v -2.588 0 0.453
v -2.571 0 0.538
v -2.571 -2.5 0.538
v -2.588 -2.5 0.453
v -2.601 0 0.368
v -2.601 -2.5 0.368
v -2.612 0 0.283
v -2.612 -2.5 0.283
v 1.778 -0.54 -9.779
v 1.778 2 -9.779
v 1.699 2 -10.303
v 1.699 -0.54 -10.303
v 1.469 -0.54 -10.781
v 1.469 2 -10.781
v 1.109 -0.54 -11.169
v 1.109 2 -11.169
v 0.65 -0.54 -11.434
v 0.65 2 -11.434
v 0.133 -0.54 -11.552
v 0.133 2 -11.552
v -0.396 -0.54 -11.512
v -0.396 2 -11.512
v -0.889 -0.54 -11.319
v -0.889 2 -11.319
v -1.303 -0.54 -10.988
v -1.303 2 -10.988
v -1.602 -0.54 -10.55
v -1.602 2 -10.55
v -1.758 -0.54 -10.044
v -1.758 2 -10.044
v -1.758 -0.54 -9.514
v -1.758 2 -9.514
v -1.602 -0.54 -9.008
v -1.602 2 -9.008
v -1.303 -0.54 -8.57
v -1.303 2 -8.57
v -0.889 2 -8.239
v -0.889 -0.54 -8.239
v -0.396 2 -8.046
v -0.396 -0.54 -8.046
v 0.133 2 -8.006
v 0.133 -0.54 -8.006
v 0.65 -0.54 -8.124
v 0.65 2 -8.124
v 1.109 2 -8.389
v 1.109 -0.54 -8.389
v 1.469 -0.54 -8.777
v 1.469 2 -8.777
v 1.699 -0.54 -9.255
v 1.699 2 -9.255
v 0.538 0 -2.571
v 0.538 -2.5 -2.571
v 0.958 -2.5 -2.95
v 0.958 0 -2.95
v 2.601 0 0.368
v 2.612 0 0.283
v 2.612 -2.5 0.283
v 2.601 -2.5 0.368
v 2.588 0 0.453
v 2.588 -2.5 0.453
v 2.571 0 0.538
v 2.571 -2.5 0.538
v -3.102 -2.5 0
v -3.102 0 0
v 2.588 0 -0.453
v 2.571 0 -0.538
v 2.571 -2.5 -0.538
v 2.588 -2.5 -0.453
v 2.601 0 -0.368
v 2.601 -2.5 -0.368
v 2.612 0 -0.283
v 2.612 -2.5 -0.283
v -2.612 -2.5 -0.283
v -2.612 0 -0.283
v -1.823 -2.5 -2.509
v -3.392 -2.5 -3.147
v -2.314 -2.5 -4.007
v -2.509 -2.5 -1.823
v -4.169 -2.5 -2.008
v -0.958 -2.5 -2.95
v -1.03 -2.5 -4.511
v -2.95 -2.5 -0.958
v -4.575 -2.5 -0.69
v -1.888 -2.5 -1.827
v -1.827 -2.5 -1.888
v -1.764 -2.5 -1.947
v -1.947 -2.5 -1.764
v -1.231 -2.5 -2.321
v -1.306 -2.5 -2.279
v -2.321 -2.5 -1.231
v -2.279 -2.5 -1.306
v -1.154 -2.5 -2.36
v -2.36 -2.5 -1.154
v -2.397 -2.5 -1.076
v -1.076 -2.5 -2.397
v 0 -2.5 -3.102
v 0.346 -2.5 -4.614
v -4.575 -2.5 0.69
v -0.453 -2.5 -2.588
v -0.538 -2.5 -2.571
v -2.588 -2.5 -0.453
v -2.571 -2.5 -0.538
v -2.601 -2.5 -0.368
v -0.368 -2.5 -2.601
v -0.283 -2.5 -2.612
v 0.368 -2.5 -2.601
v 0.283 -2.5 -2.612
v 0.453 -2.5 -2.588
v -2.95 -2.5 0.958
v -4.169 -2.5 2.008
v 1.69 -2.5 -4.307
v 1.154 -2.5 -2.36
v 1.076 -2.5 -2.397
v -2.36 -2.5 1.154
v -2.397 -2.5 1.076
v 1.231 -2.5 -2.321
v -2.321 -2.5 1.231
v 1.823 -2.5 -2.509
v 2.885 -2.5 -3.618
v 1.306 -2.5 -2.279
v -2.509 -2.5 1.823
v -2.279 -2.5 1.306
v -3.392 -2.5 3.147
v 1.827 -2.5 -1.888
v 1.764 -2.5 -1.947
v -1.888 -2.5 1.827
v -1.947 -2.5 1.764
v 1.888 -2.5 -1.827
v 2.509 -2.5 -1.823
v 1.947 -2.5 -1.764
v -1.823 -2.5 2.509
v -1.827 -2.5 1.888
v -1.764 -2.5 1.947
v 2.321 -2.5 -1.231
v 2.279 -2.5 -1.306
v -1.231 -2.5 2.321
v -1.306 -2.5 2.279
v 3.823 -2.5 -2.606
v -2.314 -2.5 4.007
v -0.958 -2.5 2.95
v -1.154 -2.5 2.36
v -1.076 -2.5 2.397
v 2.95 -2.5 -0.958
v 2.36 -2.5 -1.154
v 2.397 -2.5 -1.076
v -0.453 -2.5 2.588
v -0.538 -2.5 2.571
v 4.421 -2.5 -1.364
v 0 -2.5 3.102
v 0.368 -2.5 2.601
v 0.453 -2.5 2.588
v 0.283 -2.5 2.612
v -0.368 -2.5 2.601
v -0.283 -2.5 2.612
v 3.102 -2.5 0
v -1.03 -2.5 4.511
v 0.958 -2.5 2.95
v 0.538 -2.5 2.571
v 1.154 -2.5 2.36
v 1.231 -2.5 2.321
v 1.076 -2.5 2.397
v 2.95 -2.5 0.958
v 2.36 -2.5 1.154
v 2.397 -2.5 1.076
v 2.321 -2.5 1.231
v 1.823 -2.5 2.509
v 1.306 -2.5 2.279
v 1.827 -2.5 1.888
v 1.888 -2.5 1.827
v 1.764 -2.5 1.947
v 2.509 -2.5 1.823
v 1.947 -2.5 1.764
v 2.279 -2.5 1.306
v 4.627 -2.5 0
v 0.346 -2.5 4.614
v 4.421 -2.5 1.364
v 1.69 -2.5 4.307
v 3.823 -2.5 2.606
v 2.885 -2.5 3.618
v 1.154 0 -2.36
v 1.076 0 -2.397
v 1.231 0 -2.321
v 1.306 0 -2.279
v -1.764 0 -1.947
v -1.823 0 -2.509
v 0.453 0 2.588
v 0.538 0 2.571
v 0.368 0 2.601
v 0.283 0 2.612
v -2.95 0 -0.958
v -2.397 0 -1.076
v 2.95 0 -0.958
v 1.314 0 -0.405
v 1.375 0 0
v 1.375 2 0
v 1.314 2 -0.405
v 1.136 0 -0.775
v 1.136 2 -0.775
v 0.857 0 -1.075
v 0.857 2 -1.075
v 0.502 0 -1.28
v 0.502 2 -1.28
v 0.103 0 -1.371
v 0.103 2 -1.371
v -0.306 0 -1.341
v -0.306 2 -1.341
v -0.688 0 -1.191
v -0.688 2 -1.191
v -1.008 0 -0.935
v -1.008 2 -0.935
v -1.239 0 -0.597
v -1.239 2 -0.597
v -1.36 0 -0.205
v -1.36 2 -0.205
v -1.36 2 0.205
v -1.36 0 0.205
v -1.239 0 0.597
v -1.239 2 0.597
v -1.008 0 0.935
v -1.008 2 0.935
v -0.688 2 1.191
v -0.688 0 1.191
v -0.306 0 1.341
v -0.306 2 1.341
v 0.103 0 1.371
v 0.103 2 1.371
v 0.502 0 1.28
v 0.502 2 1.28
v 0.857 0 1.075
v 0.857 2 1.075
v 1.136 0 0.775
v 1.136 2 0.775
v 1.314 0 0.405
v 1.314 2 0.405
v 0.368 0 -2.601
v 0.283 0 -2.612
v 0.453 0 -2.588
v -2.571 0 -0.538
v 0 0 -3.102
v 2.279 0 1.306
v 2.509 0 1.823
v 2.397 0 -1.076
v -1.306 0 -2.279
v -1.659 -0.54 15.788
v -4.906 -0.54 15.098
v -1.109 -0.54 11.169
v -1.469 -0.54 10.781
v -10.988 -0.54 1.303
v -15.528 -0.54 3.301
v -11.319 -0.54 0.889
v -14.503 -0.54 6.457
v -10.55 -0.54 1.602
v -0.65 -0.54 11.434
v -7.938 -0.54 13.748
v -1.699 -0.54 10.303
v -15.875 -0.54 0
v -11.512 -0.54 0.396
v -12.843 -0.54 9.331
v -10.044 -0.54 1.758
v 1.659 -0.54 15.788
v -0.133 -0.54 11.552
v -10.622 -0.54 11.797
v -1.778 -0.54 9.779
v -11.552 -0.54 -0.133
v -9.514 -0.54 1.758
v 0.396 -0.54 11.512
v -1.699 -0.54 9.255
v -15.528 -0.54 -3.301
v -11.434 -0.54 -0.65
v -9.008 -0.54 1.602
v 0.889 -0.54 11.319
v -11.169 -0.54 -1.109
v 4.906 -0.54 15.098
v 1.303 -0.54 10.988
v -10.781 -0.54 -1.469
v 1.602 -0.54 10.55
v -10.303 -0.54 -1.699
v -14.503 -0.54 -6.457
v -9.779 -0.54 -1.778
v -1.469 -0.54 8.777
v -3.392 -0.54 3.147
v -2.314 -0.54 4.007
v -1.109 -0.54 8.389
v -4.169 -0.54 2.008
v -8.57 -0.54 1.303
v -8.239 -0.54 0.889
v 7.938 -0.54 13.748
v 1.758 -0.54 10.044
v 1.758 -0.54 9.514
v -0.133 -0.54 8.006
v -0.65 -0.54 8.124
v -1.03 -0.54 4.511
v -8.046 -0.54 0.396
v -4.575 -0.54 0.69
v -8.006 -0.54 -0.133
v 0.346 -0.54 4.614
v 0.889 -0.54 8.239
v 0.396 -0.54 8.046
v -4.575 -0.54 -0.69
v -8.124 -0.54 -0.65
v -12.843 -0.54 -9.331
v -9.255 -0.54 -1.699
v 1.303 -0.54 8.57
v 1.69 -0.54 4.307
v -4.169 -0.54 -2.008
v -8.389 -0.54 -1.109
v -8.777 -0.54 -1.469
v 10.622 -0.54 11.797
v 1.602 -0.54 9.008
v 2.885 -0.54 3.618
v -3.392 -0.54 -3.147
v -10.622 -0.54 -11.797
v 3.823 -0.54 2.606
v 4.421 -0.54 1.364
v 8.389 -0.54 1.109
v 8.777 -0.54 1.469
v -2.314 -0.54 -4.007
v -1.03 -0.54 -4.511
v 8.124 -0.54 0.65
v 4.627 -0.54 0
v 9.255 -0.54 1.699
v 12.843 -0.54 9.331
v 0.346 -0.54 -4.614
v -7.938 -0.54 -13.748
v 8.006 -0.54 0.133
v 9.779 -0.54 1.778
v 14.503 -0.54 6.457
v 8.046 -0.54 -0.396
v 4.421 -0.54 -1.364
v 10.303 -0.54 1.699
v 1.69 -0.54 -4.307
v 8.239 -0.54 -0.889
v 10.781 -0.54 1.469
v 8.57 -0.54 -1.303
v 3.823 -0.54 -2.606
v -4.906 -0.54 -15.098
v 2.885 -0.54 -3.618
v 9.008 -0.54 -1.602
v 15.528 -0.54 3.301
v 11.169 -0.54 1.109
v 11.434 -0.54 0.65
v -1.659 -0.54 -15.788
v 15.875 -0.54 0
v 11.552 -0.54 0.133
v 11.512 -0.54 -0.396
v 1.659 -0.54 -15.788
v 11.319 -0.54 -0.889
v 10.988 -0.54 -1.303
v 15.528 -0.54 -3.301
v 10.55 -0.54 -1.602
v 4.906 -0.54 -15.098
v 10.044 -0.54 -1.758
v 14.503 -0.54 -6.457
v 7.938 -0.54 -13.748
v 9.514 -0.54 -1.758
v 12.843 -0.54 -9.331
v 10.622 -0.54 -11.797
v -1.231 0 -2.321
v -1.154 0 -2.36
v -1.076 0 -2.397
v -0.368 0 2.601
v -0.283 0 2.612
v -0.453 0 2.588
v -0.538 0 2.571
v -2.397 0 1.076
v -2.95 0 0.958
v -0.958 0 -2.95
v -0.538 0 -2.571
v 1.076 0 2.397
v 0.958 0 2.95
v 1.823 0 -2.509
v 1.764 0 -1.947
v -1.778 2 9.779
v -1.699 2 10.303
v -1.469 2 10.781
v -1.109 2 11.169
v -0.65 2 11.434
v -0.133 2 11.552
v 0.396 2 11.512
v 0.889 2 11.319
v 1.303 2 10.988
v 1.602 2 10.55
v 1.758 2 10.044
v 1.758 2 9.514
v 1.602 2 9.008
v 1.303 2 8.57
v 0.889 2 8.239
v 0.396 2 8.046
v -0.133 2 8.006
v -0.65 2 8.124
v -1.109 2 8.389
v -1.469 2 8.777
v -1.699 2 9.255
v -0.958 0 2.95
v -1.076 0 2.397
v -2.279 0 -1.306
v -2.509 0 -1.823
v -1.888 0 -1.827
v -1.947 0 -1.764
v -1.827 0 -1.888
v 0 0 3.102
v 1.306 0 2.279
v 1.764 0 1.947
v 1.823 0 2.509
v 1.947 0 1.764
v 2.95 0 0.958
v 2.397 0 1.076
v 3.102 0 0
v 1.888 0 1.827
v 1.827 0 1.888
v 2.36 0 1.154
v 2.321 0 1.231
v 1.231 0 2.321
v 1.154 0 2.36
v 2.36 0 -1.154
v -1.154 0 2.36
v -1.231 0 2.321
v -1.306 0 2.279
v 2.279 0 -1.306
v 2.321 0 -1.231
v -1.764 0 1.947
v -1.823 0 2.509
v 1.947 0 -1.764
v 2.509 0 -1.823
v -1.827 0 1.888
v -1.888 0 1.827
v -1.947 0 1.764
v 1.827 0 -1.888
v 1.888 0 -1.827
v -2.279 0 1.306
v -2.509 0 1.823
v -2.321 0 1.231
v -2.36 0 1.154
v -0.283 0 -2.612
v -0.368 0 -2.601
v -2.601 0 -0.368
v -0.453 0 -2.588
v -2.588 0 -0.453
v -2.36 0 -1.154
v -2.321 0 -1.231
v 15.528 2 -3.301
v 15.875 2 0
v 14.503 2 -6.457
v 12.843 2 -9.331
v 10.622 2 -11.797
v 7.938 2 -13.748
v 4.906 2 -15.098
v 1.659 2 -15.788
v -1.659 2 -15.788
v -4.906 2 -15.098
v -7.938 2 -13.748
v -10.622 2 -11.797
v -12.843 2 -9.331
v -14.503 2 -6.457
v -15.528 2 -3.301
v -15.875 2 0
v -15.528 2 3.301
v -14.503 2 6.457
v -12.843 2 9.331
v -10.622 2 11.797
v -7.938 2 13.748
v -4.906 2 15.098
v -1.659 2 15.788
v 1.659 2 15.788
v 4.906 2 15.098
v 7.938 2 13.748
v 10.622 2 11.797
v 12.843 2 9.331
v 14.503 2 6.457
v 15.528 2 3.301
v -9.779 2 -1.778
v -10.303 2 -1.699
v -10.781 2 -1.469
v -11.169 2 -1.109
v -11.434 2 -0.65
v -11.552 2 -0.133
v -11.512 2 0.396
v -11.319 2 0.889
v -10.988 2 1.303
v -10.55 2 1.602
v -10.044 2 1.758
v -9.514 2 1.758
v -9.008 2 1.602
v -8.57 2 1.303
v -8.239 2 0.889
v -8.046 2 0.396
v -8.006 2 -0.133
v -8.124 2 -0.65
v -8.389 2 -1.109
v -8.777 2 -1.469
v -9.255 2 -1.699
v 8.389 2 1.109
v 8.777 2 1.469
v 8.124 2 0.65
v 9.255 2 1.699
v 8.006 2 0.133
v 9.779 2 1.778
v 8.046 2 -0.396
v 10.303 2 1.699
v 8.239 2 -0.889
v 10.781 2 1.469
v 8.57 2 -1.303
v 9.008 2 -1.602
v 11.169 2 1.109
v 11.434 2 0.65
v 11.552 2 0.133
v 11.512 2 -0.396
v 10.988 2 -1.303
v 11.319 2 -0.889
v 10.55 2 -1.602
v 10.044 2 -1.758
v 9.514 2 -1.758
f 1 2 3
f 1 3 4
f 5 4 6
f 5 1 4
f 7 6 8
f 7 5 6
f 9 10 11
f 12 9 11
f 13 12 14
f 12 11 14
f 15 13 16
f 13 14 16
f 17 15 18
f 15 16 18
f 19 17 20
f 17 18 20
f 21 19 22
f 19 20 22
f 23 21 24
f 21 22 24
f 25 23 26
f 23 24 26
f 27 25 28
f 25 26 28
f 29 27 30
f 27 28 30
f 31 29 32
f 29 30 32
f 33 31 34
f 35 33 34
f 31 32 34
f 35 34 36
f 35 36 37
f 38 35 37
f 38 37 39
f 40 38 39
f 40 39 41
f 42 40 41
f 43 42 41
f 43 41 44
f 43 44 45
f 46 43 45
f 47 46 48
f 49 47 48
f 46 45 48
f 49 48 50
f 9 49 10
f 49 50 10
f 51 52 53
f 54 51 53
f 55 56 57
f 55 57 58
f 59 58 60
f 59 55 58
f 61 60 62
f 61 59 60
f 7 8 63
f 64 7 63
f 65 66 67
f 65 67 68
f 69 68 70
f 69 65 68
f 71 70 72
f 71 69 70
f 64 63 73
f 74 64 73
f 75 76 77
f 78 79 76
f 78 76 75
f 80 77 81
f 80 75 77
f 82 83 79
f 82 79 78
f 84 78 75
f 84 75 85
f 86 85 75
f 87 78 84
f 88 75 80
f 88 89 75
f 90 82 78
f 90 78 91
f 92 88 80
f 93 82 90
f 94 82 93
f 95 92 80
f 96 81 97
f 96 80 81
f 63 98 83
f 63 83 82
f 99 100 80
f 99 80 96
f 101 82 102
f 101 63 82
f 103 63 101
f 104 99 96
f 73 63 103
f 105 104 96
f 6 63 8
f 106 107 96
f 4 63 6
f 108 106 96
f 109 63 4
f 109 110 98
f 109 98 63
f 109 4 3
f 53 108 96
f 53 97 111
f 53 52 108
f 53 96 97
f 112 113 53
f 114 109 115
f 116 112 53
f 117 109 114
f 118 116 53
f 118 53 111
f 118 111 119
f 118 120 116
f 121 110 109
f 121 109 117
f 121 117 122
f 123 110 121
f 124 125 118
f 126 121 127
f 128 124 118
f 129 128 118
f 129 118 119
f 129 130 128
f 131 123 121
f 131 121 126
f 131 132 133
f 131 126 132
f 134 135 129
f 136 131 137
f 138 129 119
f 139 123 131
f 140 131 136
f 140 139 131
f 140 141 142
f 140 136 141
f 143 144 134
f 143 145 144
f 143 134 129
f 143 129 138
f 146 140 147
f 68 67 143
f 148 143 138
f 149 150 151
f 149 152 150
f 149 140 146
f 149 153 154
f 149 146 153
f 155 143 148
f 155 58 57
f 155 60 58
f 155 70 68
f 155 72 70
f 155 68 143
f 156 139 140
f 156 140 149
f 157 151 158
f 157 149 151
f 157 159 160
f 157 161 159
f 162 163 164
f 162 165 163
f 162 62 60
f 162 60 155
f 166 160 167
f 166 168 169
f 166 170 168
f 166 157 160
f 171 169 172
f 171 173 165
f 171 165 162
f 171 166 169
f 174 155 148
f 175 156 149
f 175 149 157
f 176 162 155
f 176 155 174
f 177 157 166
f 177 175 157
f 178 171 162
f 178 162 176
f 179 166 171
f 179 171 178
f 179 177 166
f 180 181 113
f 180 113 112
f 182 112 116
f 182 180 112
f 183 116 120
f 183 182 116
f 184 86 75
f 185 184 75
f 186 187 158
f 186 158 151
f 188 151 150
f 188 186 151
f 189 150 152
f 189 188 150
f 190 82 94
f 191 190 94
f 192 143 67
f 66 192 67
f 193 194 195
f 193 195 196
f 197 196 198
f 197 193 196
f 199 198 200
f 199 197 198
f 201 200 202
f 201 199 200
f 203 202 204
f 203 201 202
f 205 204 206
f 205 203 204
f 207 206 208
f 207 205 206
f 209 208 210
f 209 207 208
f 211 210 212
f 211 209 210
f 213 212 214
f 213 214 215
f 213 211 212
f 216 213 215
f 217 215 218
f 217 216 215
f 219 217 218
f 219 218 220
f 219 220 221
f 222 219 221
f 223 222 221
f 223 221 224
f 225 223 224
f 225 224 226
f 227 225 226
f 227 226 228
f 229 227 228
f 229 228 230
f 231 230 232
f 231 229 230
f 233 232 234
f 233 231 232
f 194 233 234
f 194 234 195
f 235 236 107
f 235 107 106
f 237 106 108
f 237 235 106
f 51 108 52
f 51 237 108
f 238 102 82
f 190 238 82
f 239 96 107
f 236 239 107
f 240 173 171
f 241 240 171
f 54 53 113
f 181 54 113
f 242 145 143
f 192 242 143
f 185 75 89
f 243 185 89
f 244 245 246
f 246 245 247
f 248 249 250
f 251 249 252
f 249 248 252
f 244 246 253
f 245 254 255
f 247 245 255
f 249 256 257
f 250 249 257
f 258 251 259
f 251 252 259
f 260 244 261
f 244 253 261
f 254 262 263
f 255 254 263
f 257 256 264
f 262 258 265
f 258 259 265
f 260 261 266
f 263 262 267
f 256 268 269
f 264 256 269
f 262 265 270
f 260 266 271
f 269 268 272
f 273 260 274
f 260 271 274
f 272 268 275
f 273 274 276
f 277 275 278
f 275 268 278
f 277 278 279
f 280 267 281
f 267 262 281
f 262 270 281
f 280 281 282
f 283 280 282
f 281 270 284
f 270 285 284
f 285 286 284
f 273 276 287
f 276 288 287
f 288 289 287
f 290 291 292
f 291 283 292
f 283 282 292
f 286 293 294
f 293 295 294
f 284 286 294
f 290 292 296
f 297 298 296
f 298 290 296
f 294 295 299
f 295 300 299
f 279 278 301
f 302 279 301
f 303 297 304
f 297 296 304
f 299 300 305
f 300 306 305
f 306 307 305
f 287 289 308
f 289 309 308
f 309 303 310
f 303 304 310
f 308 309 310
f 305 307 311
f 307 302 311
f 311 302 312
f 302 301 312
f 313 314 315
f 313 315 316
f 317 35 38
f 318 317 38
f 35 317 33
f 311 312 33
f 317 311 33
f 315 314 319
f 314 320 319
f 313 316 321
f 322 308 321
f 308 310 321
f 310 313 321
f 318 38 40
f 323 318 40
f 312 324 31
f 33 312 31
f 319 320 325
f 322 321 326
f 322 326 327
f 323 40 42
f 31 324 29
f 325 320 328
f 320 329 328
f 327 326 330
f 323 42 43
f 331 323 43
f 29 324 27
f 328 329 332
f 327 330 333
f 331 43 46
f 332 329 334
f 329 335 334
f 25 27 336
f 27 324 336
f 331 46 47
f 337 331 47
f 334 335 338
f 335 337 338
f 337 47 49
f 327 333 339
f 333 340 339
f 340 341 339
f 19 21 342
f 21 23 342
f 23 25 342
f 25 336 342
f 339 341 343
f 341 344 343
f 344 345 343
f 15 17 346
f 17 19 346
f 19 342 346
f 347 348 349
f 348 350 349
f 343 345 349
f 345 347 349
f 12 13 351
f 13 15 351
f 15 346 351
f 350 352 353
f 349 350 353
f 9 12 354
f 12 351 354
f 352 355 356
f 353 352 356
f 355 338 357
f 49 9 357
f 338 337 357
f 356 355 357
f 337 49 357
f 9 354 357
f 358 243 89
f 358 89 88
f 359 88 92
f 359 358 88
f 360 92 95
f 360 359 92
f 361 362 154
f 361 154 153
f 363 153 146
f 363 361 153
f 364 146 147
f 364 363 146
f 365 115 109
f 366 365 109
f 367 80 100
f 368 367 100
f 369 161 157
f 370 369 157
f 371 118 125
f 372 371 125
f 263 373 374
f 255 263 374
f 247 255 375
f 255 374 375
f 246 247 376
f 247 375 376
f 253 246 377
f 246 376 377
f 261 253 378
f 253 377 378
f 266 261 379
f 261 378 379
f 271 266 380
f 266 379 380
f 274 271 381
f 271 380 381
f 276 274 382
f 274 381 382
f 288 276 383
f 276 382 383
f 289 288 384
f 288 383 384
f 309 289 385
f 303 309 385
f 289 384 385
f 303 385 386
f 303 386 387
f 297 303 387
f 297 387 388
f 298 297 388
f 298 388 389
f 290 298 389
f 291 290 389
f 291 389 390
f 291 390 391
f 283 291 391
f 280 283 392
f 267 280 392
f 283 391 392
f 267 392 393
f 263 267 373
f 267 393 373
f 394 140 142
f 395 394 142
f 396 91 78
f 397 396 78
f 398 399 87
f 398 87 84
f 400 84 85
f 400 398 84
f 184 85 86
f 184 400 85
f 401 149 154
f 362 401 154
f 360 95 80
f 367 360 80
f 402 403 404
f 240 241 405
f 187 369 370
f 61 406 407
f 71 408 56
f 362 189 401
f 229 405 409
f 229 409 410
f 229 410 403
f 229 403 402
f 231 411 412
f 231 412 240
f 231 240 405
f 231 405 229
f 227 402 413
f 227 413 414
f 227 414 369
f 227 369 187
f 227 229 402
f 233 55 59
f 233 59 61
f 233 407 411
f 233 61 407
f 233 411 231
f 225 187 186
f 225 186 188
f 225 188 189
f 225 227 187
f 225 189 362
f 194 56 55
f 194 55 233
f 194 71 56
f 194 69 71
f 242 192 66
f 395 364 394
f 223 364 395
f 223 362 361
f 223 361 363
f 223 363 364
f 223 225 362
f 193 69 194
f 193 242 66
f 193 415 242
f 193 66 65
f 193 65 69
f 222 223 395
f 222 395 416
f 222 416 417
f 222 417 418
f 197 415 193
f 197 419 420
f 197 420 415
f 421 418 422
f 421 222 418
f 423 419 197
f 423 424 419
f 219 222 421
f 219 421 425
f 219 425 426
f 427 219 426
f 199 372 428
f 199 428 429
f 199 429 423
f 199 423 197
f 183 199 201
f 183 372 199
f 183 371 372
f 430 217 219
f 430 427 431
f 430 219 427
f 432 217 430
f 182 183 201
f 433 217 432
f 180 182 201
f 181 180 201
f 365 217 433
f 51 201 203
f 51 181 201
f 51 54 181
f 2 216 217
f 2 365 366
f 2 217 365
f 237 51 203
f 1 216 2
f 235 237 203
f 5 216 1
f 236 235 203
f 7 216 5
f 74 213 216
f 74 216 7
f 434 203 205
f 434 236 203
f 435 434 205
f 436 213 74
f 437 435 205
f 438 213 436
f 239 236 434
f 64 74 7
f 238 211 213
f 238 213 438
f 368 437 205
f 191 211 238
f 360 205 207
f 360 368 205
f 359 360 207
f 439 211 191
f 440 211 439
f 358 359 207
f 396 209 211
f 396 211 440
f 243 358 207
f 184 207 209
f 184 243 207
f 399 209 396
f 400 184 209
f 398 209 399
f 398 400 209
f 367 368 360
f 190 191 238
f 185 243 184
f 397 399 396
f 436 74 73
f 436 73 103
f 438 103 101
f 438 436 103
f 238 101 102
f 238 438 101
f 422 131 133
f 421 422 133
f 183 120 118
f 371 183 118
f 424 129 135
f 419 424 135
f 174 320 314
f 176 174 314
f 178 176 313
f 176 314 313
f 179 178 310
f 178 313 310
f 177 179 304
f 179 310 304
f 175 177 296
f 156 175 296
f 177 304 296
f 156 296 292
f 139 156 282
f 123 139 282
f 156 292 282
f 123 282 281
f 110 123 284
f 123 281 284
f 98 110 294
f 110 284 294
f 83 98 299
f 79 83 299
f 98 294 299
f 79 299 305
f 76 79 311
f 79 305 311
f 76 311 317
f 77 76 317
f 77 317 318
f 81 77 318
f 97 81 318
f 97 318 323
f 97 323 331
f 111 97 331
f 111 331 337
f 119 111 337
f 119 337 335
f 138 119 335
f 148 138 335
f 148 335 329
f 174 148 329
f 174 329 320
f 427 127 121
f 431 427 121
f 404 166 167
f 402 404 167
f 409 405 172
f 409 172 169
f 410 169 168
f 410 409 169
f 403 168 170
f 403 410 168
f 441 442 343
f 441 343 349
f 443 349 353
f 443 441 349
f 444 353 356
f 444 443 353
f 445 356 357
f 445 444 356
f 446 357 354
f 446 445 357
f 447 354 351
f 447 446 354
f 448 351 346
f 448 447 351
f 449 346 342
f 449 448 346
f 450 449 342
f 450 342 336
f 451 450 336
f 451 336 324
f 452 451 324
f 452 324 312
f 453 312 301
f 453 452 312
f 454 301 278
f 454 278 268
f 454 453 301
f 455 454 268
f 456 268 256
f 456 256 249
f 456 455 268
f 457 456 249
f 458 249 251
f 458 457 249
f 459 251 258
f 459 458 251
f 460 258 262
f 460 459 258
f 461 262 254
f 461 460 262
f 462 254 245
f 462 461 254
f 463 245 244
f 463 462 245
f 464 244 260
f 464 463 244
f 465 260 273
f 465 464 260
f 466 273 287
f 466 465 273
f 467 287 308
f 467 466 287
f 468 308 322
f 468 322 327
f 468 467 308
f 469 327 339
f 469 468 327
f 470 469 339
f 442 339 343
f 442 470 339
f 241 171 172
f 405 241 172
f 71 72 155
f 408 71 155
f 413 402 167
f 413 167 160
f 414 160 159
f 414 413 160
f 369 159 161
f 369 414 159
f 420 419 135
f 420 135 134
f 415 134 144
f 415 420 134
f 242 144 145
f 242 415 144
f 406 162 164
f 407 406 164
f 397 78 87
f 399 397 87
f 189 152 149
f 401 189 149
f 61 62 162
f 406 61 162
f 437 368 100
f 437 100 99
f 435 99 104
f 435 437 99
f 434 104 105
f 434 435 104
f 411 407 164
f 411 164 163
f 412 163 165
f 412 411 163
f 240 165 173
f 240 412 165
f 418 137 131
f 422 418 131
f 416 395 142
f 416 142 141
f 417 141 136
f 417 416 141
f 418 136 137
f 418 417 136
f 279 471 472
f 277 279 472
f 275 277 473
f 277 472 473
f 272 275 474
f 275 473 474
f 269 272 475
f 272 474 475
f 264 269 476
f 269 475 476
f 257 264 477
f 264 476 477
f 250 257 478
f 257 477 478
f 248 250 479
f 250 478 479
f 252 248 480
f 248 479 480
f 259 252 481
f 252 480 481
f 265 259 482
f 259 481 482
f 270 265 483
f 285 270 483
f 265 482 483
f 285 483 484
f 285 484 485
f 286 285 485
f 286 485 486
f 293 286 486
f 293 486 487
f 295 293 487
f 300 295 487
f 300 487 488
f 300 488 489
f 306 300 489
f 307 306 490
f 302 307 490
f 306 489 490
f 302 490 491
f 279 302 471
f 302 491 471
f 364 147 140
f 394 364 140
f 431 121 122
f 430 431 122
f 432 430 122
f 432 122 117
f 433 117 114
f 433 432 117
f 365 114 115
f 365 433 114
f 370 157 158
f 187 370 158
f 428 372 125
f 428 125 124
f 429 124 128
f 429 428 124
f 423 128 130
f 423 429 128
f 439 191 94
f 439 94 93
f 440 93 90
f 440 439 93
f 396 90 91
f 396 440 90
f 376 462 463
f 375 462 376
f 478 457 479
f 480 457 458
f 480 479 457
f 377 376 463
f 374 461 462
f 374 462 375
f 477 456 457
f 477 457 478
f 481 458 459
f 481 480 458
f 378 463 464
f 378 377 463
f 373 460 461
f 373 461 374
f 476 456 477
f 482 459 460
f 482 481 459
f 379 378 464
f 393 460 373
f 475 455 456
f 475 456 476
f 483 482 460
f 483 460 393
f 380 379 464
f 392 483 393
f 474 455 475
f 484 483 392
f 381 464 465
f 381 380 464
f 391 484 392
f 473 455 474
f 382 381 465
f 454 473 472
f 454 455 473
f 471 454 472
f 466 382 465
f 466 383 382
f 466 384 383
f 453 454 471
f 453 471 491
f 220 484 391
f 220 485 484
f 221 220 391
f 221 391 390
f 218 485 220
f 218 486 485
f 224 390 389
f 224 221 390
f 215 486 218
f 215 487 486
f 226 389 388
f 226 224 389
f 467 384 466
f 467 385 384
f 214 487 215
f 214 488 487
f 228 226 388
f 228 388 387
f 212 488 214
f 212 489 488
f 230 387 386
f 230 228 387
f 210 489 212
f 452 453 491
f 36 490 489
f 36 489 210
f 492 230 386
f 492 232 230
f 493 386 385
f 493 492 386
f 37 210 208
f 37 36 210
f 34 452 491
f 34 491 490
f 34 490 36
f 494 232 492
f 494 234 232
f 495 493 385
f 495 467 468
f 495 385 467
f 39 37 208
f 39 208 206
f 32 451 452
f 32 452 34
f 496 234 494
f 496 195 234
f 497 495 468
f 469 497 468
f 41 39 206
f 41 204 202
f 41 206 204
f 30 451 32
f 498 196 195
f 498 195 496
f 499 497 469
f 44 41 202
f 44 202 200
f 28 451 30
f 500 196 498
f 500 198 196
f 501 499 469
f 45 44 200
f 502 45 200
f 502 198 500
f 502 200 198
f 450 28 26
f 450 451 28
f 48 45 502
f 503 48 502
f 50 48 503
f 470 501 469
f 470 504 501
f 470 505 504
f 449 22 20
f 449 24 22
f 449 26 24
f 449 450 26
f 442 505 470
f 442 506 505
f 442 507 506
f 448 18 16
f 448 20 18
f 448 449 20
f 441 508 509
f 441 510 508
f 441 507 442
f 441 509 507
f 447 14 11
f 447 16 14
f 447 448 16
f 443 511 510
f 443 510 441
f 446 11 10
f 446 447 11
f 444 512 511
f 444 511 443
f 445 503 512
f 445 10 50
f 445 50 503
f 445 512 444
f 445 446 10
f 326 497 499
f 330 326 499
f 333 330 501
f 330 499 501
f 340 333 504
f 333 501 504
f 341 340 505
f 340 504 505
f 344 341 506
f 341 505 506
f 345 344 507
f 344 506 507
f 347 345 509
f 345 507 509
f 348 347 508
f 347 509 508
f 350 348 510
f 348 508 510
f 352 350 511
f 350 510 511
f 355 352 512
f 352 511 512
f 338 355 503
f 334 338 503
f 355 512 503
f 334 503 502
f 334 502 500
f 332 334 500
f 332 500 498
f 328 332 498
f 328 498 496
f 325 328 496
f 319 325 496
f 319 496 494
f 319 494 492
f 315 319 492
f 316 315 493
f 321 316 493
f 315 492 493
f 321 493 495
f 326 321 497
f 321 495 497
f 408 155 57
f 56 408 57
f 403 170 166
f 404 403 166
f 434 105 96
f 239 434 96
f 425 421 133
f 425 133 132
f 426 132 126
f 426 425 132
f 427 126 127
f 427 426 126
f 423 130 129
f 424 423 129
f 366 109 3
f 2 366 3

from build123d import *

# Parameters (mm, degrees)
SKETCH1_R           = 0.5
SKETCH1_R_2         = 1.375
BOSS_EXTRUDE1_DEPTH = 2
SKETCH4_R           = 4.6270037
SKETCH4_R_2         = 2.6270037
BOSS_EXTRUDE3_DEPTH = 2.5
CUT_EXTRUDE3_DEPTH  = 2.5
SKETCH6_R           = 15.875
SKETCH6_R_2         = 3.75
BOSS_EXTRUDE6_DEPTH = 2.54
SKETCH7_R           = 1.778
CUT_EXTRUDE4_DEPTH  = 2.54
CIRPATTERN1_COUNT   = 4


with BuildPart() as part:
    # Sketch1 → Boss-Extrude1 (new body)
    with BuildSketch(Plane(origin=(0, 0, 0), x_dir=(1, 0, 0), z_dir=(0, 1, 0))):
        with BuildLine():
            Line((-4, 4), (-2.467435953, 13.402193757))
            ThreePointArc((-2.467435953, 13.402193757), (0, 15.5), (2.467435953, 13.402193757))
            Line((2.467435953, 13.402193757), (4, 4))
            Line((4, 4), (12.448472752, 2.459445505))
            ThreePointArc((12.448472752, 2.459445505), (14.5, 0), (12.448472752, -2.459445505))
            Line((12.448472752, -2.459445505), (4, -4))
            Line((4, -4), (2.467435953, -13.402193757))
            ThreePointArc((2.467435953, -13.402193757), (0, -15.5), (-2.467435953, -13.402193757))
            Line((-2.467435953, -13.402193757), (-4, -4))
            Line((-4, -4), (-12.448472752, -2.459445505))
            ThreePointArc((-12.448472752, -2.459445505), (-14.5, 0), (-12.448472752, 2.459445505))
            Line((-12.448472752, 2.459445505), (-4, 4))
        make_face()
        with Locations((0, 12)):
            Circle(SKETCH1_R, mode=Mode.SUBTRACT)
        with Locations((0, 9.5)):
            Circle(SKETCH1_R, mode=Mode.SUBTRACT)
        with Locations((0, 7.5)):
            Circle(SKETCH1_R, mode=Mode.SUBTRACT)
        with Locations((12, 0)):
            Circle(SKETCH1_R, mode=Mode.SUBTRACT)
        with Locations((9.5, 0)):
            Circle(SKETCH1_R, mode=Mode.SUBTRACT)
        with Locations((7.5, 0)):
            Circle(SKETCH1_R, mode=Mode.SUBTRACT)
        with Locations((0, -12)):
            Circle(SKETCH1_R, mode=Mode.SUBTRACT)
        with Locations((0, -9.5)):
            Circle(SKETCH1_R, mode=Mode.SUBTRACT)
        with Locations((0, -7.5)):
            Circle(SKETCH1_R, mode=Mode.SUBTRACT)
        with Locations((-12, 0)):
            Circle(SKETCH1_R, mode=Mode.SUBTRACT)
        with Locations((-9.5, 0)):
            Circle(SKETCH1_R, mode=Mode.SUBTRACT)
        with Locations((-7.5, 0)):
            Circle(SKETCH1_R, mode=Mode.SUBTRACT)
        Circle(SKETCH1_R_2, mode=Mode.SUBTRACT)
    extrude(amount=BOSS_EXTRUDE1_DEPTH)

    # Sketch4 → Boss-Extrude3 (add)
    with BuildSketch(Plane.XZ):
        Circle(SKETCH4_R)
        Circle(SKETCH4_R_2, mode=Mode.SUBTRACT)
    extrude(amount=BOSS_EXTRUDE3_DEPTH)

    # Sketch5 → Cut-Extrude3 (cut)
    with BuildSketch(Plane.XZ.offset(2.5)):
        with BuildLine():
            Line((0.282820055, 2.611735296), (0, 3.101594))
            Line((0, 3.101594), (-0.282820055, 2.611735296))
            ThreePointArc((-0.282820055, 2.611735296), (0, 2.6270037), (0.282820055, 2.611735296))
        make_face()
        with BuildLine():
            ThreePointArc((-1.076048447, 2.396511669), (-0.811788788, 2.498428987), (-0.538092735, 2.571304075))
            Line((-0.538092735, 2.571304075), (-0.958445256, 2.949791185))
            Line((-0.958445256, 2.949791185), (-1.076048447, 2.396511669))
        make_face()
        with BuildLine():
            Line((0.958445256, 2.949791185), (0.538092735, 2.571304075))
            ThreePointArc((0.538092735, 2.571304075), (0.811788788, 2.498428987), (1.076048447, 2.396511669))
            Line((1.076048447, 2.396511669), (0.958445256, 2.949791185))
        make_face()
        with BuildLine():
            ThreePointArc((-1.76394572, 1.946700782), (-1.544114033, 2.125290638), (-1.306333259, 2.279175696))
            Line((-1.306333259, 2.279175696), (-1.823071212, 2.509242256))
            Line((-1.823071212, 2.509242256), (-1.76394572, 1.946700782))
        make_face()
        with BuildLine():
            Line((1.823071212, 2.509242256), (1.306333259, 2.279175696))
            ThreePointArc((1.306333259, 2.279175696), (1.544114033, 2.125290638), (1.76394572, 1.946700782))
            Line((1.76394572, 1.946700782), (1.823071212, 2.509242256))
        make_face()
        with BuildLine():
            ThreePointArc((-2.279175696, 1.306333259), (-2.125290638, 1.544114033), (-1.946700782, 1.76394572))
            Line((-1.946700782, 1.76394572), (-2.509242256, 1.823071212))
            Line((-2.509242256, 1.823071212), (-2.279175696, 1.306333259))
        make_face()
        with BuildLine():
            Line((2.509242256, 1.823071212), (1.946700782, 1.76394572))
            ThreePointArc((1.946700782, 1.76394572), (2.125290638, 1.544114033), (2.279175696, 1.306333259))
            Line((2.279175696, 1.306333259), (2.509242256, 1.823071212))
        make_face()
        with BuildLine():
            ThreePointArc((-2.571304075, 0.538092735), (-2.498428987, 0.811788788), (-2.396511669, 1.076048447))
            Line((-2.396511669, 1.076048447), (-2.949791185, 0.958445256))
            Line((-2.949791185, 0.958445256), (-2.571304075, 0.538092735))
        make_face()
        with BuildLine():
            Line((2.949791185, 0.958445256), (2.396511669, 1.076048447))
            ThreePointArc((2.396511669, 1.076048447), (2.498428987, 0.811788788), (2.571304075, 0.538092735))
            Line((2.571304075, 0.538092735), (2.949791185, 0.958445256))
        make_face()
        with BuildLine():
            ThreePointArc((-2.611735296, -0.282820055), (-2.6270037, 0), (-2.611735296, 0.282820055))
            Line((-2.611735296, 0.282820055), (-3.101594, 0))
            Line((-3.101594, 0), (-2.611735296, -0.282820055))
        make_face()
        with BuildLine():
            Line((3.101594, 0), (2.611735296, 0.282820055))
            ThreePointArc((2.611735296, 0.282820055), (2.6270037, 0), (2.611735296, -0.282820055))
            Line((2.611735296, -0.282820055), (3.101594, 0))
        make_face()
        with BuildLine():
            ThreePointArc((-2.396511669, -1.076048447), (-2.498428987, -0.811788788), (-2.571304075, -0.538092735))
            Line((-2.571304075, -0.538092735), (-2.949791185, -0.958445256))
            Line((-2.949791185, -0.958445256), (-2.396511669, -1.076048447))
        make_face()
        with BuildLine():
            Line((2.949791185, -0.958445256), (2.571304075, -0.538092735))
            ThreePointArc((2.571304075, -0.538092735), (2.498428987, -0.811788788), (2.396511669, -1.076048447))
            Line((2.396511669, -1.076048447), (2.949791185, -0.958445256))
        make_face()
        with BuildLine():
            ThreePointArc((-1.946700782, -1.76394572), (-2.125290638, -1.544114033), (-2.279175696, -1.306333259))
            Line((-2.279175696, -1.306333259), (-2.509242256, -1.823071212))
            Line((-2.509242256, -1.823071212), (-1.946700782, -1.76394572))
        make_face()
        with BuildLine():
            Line((2.509242256, -1.823071212), (2.279175696, -1.306333259))
            ThreePointArc((2.279175696, -1.306333259), (2.125290638, -1.544114033), (1.946700782, -1.76394572))
            Line((1.946700782, -1.76394572), (2.509242256, -1.823071212))
        make_face()
        with BuildLine():
            ThreePointArc((-1.306333259, -2.279175696), (-1.544114033, -2.125290638), (-1.76394572, -1.946700782))
            Line((-1.76394572, -1.946700782), (-1.823071212, -2.509242256))
            Line((-1.823071212, -2.509242256), (-1.306333259, -2.279175696))
        make_face()
        with BuildLine():
            Line((1.823071212, -2.509242256), (1.76394572, -1.946700782))
            ThreePointArc((1.76394572, -1.946700782), (1.544114033, -2.125290638), (1.306333259, -2.279175696))
            Line((1.306333259, -2.279175696), (1.823071212, -2.509242256))
        make_face()
        with BuildLine():
            ThreePointArc((-0.538092735, -2.571304075), (-0.811788788, -2.498428987), (-1.076048447, -2.396511669))
            Line((-1.076048447, -2.396511669), (-0.958445256, -2.949791185))
            Line((-0.958445256, -2.949791185), (-0.538092735, -2.571304075))
        make_face()
        with BuildLine():
            Line((0.958445256, -2.949791185), (1.076048447, -2.396511669))
            ThreePointArc((1.076048447, -2.396511669), (0.811788788, -2.498428987), (0.538092735, -2.571304075))
            Line((0.538092735, -2.571304075), (0.958445256, -2.949791185))
        make_face()
        with BuildLine():
            ThreePointArc((0.282820055, -2.611735296), (0, -2.6270037), (-0.282820055, -2.611735296))
            Line((-0.282820055, -2.611735296), (0, -3.101594))
            Line((0, -3.101594), (0.282820055, -2.611735296))
        make_face()
    extrude(amount=-CUT_EXTRUDE3_DEPTH, mode=Mode.SUBTRACT)

    # Sketch6 → Boss-Extrude6 (add)
    with BuildSketch(Plane(origin=(0, 2, 0), x_dir=(1, 0, 0), z_dir=(0, 1, 0))):
        Circle(SKETCH6_R)
        Circle(SKETCH6_R_2, mode=Mode.SUBTRACT)
    extrude(amount=-BOSS_EXTRUDE6_DEPTH)

    # Sketch7 → Cut-Extrude4 (cut)
    with BuildSketch(Plane(origin=(0, 2, 0), x_dir=(1, 0, 0), z_dir=(0, 1, 0))):
        with Locations((0, 9.779)):
            Circle(SKETCH7_R)
    cut_extrude4 = extrude(amount=-CUT_EXTRUDE4_DEPTH, mode=Mode.SUBTRACT)

    # CirPattern1: Cut-Extrude4 ×4 about axis
    cirpattern1_axis = Axis((0, 0, 0), (0, 1, 0))
    for i in range(1, CIRPATTERN1_COUNT):
        add(cut_extrude4.rotate(cirpattern1_axis, i * 360 / CIRPATTERN1_COUNT), mode=Mode.SUBTRACT)


solid = part.part
